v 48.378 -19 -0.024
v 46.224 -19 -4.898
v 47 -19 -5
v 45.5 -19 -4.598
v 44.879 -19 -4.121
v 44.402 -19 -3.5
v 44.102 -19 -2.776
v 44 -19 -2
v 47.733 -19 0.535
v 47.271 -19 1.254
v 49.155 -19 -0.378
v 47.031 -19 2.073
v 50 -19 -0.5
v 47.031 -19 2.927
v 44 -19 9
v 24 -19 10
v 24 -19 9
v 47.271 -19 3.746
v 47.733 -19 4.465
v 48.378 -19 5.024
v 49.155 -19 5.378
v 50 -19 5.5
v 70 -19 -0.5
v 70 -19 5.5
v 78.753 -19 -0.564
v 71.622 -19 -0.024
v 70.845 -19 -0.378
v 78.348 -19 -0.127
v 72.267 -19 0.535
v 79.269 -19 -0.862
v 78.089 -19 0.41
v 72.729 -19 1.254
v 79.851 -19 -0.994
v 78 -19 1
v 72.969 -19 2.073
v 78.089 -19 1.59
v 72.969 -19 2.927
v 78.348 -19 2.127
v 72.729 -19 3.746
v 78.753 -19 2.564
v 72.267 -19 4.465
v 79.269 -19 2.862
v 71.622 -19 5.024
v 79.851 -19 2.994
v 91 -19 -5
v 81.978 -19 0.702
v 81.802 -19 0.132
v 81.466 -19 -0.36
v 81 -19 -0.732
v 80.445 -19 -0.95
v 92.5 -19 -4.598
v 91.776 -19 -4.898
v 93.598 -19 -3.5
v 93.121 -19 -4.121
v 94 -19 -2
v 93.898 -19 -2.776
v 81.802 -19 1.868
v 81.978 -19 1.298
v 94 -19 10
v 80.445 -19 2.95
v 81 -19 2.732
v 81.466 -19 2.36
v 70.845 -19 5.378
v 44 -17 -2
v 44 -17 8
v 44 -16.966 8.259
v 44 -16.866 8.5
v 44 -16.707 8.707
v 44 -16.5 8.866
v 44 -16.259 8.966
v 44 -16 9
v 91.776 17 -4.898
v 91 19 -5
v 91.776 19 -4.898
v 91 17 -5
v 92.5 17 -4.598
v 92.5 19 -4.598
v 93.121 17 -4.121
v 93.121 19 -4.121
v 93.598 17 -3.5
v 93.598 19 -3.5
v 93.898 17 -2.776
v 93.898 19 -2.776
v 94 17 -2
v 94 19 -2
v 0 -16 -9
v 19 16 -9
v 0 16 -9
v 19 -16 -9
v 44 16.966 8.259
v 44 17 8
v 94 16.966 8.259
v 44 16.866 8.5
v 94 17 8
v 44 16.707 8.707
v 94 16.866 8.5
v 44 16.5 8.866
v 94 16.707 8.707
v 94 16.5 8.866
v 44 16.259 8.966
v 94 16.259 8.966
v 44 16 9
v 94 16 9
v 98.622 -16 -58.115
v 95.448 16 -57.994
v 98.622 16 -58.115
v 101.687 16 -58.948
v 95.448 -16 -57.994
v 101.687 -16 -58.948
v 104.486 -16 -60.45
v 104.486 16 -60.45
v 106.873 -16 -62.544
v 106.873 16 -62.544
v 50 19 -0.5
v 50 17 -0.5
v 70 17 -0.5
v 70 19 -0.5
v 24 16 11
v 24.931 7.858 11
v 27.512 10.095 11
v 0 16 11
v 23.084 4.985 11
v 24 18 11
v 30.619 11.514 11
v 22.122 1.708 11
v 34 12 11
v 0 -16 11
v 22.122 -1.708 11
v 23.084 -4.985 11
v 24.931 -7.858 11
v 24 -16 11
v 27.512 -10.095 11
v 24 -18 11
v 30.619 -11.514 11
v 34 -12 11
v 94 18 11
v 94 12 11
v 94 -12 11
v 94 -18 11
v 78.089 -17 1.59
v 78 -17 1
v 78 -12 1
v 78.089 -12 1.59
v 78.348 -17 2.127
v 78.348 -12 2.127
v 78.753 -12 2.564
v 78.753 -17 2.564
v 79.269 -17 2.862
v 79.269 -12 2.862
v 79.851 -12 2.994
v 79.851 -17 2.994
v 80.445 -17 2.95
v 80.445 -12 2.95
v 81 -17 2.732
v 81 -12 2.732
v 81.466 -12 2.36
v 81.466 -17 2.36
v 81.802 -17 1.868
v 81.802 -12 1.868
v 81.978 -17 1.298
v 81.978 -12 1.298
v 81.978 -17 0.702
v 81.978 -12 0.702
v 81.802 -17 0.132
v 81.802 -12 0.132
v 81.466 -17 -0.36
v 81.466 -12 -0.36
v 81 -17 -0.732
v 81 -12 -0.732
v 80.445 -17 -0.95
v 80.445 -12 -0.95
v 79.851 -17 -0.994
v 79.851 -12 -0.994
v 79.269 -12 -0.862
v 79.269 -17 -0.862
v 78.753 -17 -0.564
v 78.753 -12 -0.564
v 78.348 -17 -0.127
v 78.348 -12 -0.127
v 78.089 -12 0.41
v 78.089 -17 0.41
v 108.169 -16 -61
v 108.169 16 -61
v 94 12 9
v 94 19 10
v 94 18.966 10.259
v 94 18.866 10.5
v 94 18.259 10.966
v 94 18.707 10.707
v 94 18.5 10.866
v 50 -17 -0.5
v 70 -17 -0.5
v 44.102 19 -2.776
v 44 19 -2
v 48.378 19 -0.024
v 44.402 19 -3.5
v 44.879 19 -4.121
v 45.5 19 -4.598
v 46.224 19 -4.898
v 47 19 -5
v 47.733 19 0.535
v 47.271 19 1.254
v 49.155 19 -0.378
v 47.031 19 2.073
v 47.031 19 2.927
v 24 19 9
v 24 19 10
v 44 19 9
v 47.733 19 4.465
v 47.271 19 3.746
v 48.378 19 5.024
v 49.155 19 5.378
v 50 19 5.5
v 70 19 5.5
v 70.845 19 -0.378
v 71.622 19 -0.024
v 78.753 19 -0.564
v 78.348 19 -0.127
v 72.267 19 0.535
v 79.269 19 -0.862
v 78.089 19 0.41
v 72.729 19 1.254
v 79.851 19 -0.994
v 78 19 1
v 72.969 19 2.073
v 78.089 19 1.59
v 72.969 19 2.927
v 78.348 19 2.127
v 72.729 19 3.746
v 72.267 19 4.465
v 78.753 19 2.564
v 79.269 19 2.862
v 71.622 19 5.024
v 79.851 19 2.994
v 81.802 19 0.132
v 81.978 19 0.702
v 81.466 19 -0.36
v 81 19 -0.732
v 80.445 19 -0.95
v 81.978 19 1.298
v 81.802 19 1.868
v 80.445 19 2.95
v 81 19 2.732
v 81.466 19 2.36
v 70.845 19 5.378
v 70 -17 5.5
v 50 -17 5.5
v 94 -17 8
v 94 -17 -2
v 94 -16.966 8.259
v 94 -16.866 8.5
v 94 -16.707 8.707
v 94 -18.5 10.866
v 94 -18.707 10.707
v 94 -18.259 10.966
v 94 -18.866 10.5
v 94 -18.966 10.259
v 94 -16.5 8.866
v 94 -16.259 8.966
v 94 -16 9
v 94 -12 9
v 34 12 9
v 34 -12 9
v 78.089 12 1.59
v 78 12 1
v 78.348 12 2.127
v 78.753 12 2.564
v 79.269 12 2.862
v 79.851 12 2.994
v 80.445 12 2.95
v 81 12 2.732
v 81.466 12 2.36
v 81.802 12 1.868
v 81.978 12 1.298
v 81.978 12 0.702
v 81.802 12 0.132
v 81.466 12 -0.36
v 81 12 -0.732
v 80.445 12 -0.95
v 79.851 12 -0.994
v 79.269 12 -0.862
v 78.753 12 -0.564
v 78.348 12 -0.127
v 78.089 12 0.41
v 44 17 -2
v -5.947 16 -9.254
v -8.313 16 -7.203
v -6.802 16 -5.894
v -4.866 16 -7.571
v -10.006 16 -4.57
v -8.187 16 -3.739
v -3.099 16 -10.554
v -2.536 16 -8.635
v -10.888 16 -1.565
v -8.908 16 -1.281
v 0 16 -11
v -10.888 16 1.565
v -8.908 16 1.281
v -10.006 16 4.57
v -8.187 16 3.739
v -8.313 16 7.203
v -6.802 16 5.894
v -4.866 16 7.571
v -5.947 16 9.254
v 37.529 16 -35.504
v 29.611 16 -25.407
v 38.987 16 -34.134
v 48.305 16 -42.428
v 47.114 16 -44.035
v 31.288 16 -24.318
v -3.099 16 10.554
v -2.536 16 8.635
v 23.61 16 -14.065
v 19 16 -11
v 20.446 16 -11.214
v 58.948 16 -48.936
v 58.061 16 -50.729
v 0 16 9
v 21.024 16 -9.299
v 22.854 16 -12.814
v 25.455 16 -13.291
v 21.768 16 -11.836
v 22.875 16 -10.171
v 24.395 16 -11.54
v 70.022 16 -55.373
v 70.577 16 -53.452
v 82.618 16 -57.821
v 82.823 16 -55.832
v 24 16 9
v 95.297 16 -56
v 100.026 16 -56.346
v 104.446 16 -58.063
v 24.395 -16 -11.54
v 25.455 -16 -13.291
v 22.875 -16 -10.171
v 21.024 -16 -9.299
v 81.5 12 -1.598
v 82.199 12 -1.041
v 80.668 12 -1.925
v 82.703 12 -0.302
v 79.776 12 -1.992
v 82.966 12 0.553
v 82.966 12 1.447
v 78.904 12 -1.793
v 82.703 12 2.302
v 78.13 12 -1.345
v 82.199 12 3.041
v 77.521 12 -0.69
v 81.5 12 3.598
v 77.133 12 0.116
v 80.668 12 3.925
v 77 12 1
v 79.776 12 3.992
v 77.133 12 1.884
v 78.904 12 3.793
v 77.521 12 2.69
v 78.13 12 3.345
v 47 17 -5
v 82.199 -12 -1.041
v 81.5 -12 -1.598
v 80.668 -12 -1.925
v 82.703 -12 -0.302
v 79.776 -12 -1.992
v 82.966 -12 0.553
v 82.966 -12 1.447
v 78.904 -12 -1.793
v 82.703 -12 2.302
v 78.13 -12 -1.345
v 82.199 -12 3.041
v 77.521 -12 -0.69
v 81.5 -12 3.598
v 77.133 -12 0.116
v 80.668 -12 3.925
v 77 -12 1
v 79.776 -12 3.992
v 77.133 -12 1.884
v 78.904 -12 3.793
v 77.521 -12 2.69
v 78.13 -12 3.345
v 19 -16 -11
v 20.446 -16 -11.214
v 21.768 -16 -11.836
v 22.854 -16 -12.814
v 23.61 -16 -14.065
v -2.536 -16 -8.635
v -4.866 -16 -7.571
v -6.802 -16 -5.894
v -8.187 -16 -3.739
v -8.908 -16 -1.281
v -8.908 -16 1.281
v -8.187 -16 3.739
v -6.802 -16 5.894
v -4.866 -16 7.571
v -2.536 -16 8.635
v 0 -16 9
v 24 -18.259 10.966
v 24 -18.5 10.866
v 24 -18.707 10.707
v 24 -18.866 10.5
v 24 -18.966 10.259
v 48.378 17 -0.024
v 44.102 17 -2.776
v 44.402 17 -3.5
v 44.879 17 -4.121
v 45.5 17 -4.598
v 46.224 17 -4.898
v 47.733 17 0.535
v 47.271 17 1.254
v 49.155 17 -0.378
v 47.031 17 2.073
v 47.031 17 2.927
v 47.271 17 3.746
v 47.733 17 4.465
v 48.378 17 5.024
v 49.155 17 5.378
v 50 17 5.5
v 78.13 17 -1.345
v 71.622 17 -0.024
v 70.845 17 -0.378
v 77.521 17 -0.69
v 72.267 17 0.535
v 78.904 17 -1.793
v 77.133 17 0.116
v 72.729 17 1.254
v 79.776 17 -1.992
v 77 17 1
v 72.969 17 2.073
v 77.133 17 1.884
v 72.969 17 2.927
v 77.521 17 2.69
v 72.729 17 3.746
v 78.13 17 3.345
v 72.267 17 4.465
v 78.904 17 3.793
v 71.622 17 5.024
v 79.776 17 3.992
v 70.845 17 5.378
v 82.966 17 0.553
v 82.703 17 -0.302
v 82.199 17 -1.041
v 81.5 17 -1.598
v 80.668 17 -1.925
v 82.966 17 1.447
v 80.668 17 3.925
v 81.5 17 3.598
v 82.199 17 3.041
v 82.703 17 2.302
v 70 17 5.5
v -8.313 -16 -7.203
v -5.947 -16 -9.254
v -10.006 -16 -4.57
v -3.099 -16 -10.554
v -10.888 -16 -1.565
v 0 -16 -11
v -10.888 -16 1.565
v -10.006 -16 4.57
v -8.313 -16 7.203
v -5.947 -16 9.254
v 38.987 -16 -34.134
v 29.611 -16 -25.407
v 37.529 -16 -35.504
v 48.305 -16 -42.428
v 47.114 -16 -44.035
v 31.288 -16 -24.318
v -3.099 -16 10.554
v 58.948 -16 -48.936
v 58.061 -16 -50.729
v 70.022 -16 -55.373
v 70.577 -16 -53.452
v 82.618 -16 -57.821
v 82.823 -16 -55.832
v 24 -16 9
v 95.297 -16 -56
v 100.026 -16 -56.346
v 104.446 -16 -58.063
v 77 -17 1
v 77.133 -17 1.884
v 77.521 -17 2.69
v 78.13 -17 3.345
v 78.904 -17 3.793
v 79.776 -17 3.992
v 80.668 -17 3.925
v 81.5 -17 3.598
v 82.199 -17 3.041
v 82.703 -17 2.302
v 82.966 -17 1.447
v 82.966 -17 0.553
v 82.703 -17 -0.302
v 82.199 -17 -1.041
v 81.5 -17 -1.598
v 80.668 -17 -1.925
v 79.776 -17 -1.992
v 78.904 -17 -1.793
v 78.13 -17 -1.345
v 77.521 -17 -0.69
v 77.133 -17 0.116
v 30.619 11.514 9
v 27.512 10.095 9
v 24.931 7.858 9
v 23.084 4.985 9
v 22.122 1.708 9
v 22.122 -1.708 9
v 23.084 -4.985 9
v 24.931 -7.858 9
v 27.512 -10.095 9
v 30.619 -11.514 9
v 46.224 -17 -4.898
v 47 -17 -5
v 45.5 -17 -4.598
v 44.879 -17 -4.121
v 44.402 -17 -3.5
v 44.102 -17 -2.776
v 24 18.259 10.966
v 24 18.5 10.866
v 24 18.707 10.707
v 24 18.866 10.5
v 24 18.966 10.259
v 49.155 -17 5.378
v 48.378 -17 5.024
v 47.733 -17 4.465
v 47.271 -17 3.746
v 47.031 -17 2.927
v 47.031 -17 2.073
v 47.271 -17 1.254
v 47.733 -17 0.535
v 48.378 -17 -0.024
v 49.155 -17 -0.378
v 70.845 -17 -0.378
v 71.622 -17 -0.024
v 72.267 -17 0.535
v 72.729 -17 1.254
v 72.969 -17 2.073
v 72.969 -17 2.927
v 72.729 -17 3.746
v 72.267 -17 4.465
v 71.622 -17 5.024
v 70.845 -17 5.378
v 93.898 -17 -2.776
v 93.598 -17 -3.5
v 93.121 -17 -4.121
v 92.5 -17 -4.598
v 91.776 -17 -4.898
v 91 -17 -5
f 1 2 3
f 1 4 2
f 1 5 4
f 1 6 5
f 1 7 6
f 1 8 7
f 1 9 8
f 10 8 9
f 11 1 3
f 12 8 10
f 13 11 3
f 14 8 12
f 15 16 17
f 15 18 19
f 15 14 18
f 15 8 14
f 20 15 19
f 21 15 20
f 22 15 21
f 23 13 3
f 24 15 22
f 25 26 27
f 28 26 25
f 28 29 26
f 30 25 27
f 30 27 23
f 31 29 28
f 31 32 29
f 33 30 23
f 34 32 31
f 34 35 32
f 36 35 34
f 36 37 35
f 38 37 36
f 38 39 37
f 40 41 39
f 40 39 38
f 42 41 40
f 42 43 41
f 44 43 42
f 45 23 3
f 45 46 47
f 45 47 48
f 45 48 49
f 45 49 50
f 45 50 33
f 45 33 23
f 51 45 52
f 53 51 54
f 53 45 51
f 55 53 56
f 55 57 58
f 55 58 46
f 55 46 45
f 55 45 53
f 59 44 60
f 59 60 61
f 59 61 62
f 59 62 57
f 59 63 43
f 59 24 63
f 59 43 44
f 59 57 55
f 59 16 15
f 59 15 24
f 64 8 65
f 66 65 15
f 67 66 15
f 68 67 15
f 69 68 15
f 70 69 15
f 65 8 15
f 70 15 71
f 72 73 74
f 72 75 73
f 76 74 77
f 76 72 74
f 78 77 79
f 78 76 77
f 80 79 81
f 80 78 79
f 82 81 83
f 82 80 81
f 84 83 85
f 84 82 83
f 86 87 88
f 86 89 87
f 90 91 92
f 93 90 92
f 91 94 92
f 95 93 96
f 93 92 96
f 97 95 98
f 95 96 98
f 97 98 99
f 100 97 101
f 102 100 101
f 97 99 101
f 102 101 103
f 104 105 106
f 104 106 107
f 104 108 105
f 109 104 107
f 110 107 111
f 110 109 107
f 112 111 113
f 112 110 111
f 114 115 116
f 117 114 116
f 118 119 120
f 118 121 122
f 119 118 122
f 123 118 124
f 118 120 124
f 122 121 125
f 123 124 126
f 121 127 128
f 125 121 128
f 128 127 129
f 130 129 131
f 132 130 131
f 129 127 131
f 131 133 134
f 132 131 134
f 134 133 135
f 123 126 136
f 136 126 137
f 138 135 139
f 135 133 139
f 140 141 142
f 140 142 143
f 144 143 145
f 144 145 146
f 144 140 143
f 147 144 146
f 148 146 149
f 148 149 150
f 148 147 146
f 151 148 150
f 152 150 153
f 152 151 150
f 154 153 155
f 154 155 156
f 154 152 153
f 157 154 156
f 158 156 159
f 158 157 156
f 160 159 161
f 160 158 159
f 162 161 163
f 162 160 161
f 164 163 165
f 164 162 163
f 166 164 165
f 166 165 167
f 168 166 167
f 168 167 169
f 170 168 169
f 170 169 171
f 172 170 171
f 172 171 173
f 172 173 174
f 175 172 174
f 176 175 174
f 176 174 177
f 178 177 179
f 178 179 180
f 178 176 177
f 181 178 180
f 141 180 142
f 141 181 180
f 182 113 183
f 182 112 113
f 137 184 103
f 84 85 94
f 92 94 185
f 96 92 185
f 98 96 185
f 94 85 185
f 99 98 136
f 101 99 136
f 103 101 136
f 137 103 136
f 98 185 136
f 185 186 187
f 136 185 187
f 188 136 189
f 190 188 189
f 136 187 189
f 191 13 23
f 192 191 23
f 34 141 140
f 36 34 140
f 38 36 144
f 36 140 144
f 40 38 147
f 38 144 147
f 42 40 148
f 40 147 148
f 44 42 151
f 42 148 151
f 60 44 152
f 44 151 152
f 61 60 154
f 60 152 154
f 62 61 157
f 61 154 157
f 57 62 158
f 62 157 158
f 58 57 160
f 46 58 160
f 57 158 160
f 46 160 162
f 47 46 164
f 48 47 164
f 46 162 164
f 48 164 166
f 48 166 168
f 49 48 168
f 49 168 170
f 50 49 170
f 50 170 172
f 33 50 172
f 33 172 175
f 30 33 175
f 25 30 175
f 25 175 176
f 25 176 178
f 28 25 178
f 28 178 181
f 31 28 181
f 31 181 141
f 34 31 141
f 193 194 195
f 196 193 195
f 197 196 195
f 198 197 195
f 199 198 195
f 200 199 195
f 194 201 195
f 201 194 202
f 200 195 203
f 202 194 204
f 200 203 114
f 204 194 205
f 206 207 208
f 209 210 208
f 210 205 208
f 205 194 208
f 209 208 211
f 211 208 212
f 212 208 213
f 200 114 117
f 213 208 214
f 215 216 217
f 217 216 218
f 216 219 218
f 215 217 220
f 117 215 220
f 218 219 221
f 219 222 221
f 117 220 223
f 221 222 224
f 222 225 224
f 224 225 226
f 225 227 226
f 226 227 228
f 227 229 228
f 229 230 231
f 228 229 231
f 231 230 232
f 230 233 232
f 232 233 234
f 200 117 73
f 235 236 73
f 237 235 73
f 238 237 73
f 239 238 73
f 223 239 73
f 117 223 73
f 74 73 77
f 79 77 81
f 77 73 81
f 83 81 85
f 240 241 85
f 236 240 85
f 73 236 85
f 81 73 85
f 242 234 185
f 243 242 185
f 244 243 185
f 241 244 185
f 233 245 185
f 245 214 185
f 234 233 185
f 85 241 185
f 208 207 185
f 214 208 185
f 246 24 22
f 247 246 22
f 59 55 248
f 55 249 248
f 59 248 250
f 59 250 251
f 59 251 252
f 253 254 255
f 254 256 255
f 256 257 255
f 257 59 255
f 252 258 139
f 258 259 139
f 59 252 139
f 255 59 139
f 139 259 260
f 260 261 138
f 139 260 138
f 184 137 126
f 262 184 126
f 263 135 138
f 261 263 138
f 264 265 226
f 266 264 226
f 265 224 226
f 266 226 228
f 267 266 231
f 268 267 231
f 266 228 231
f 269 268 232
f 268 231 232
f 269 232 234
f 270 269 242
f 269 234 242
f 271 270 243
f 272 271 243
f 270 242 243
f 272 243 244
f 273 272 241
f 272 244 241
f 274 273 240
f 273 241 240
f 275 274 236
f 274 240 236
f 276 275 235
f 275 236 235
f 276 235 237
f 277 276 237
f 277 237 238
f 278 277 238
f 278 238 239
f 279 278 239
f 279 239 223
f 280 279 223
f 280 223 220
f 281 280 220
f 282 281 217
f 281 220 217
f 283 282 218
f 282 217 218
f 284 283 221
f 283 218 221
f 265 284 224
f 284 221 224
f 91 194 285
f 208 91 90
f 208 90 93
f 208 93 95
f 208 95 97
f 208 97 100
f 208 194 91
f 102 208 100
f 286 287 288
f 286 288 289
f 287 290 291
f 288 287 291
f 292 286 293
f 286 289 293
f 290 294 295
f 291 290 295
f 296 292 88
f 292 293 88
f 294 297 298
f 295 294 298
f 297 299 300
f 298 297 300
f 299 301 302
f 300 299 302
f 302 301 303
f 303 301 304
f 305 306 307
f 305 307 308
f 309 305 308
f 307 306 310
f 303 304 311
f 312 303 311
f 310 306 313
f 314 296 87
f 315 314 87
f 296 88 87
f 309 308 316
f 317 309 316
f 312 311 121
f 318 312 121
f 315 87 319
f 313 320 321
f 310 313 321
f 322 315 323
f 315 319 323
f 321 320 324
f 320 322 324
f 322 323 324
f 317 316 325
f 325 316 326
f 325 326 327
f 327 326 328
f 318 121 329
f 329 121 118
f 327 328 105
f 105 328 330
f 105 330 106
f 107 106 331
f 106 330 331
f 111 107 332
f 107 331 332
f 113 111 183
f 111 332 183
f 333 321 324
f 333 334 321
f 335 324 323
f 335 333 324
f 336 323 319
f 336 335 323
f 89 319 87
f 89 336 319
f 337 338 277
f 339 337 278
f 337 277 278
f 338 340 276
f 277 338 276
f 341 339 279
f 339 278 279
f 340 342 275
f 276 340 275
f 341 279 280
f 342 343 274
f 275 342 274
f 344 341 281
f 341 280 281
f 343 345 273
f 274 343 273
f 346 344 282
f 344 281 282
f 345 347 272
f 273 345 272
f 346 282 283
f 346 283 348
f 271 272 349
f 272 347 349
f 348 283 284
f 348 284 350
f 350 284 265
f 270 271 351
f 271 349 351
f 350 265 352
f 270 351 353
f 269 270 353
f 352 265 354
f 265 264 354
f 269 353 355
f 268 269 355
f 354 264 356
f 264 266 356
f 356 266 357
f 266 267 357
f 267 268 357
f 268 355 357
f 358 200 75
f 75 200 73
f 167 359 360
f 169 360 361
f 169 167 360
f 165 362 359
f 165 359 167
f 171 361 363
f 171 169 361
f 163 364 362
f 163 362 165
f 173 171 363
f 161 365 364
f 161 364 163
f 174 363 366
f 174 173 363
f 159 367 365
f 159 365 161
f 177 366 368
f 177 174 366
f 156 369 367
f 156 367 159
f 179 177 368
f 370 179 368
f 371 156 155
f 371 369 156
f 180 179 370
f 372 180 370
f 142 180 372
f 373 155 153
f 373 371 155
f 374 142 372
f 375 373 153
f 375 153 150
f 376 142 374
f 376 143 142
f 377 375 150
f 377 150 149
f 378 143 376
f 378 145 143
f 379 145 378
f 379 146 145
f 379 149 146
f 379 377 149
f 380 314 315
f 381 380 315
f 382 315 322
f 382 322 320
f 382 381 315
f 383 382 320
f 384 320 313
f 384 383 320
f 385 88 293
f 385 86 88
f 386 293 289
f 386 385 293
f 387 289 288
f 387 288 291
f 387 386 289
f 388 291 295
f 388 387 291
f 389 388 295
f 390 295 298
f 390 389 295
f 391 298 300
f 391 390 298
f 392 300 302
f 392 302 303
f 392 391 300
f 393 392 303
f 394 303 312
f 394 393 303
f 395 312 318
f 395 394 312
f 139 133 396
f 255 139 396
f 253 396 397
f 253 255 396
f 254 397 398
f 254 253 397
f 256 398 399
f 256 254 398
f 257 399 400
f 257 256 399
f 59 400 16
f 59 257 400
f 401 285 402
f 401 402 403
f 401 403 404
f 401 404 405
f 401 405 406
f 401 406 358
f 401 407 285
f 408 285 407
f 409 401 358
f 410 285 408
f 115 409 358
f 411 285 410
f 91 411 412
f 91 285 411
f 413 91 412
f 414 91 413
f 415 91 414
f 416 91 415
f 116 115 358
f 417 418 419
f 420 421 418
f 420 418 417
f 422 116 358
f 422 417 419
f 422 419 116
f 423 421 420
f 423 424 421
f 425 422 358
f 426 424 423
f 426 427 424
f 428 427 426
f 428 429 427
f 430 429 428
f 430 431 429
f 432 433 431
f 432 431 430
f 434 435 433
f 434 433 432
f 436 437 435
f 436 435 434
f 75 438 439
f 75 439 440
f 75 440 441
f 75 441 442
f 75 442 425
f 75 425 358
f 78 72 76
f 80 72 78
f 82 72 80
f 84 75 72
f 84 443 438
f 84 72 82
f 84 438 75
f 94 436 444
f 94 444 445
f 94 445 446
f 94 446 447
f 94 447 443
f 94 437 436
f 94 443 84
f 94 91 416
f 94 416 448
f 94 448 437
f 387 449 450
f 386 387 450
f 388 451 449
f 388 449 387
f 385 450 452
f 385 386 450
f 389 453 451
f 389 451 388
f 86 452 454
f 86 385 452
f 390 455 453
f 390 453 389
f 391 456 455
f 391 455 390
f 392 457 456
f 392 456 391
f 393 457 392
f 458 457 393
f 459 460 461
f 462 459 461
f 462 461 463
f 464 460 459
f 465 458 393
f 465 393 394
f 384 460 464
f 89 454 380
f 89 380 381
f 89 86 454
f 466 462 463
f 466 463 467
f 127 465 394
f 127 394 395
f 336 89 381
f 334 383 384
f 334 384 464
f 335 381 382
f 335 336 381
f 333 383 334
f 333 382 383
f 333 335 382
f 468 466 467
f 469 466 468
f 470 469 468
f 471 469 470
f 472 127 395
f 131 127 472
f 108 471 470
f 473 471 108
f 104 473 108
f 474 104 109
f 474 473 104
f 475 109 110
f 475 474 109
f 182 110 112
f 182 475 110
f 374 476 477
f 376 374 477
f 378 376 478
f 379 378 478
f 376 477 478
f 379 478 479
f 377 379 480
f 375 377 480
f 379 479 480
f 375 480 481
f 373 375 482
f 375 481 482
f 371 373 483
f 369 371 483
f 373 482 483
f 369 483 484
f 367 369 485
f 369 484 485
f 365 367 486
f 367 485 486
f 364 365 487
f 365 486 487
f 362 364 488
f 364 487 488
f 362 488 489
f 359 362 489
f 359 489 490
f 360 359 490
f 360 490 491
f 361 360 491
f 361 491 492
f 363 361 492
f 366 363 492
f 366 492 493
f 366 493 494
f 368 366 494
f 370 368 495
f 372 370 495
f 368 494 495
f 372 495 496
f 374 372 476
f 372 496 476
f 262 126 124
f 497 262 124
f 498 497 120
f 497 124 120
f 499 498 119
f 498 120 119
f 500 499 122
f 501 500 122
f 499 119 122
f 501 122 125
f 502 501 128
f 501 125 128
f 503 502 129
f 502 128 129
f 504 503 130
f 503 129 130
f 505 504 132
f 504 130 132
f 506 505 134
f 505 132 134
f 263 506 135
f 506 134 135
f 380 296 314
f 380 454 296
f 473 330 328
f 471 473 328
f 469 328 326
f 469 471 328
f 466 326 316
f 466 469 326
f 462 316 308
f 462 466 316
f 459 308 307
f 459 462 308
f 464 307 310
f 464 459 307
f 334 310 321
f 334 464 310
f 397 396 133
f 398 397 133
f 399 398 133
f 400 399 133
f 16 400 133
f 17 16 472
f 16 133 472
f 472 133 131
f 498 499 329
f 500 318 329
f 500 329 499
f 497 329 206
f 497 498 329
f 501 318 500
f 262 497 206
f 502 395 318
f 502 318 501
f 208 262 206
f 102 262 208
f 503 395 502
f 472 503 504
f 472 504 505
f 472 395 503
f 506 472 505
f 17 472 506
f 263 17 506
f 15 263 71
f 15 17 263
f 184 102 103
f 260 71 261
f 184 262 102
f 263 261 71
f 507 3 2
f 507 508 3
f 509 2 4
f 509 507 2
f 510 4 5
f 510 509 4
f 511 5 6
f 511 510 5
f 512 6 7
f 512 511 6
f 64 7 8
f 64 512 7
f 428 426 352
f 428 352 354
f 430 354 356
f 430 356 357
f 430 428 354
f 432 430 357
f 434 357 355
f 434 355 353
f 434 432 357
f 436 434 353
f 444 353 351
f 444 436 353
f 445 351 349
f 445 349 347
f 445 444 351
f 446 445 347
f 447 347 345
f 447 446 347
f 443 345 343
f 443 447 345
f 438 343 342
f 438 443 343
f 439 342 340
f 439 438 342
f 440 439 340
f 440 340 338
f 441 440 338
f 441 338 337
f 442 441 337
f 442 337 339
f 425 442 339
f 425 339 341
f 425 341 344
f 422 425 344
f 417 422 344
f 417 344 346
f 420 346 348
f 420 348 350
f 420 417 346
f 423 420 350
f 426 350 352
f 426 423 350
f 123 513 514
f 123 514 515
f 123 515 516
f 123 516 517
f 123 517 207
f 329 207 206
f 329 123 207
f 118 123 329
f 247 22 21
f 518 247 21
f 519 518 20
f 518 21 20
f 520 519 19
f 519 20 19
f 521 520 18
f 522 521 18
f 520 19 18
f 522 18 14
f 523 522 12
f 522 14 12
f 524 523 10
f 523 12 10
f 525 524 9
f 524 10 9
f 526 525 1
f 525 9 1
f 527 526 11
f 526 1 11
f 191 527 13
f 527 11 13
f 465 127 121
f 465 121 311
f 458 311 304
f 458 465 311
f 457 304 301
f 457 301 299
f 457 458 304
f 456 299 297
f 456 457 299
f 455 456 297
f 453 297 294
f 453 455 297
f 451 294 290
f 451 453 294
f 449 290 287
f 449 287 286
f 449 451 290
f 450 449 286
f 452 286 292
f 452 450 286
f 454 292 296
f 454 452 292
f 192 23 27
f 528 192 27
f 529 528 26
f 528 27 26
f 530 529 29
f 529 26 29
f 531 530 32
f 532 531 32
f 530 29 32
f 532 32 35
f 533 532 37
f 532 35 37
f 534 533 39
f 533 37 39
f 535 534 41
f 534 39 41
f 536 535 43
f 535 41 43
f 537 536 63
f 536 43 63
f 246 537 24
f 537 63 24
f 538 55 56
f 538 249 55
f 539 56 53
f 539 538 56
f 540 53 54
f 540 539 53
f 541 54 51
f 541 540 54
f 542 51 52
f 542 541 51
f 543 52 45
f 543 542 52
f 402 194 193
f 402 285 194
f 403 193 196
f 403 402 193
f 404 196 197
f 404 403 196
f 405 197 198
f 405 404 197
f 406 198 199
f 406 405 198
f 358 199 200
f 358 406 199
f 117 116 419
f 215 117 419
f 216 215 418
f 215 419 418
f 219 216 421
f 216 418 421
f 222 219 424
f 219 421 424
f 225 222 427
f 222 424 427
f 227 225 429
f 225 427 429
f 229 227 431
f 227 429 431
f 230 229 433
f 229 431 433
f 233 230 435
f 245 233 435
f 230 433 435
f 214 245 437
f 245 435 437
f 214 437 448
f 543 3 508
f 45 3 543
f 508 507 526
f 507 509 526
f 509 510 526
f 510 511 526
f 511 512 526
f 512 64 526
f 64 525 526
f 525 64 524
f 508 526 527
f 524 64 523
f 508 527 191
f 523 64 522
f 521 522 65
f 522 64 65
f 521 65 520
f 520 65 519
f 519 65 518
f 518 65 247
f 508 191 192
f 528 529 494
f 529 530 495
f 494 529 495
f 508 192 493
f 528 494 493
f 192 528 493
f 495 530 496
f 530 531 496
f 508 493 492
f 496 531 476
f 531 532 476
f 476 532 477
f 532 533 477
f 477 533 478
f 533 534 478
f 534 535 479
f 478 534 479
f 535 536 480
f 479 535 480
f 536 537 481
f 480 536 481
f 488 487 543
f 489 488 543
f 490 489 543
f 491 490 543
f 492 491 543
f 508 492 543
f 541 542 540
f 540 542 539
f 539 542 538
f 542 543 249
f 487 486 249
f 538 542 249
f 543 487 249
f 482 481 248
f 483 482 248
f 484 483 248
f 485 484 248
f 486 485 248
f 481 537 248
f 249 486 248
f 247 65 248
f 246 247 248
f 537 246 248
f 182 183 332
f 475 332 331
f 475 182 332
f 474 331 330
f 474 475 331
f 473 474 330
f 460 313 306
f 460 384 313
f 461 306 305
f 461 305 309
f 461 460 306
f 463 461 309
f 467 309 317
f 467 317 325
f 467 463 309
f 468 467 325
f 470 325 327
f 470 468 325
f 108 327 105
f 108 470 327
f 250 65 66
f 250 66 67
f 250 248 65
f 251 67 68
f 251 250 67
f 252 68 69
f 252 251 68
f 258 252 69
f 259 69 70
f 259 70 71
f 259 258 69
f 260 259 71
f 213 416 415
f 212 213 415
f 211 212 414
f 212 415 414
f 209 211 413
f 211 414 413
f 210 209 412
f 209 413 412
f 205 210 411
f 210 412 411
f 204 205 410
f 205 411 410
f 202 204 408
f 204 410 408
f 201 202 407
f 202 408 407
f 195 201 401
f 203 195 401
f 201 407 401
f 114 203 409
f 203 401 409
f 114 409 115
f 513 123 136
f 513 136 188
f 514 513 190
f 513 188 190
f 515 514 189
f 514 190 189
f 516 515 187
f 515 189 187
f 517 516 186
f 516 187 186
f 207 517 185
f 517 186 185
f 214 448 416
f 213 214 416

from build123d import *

# Parameters (mm, degrees)
F1_DEPTH  = 16
F2_W      = 70
F2_H      = 3
F3_DEPTH  = 2
F4_W      = 50
F4_H      = 14
F5_DEPTH  = 2
F6_R      = 1
F9_DEPTH  = 4
F11_DEPTH = 38.001
F13_D     = 4
F14_R     = 3
F14_R_2   = 2
F15_DEPTH = 5
F16_R     = 3


# Not quite as in the source:
# - a pattern or mirror of a feature is missing from the dataset's text; its kind, count and spacing are read off the source's solid


with BuildPart() as f1:
    # F0 (on Front) → F1 (new body)
    with BuildSketch(Plane.XZ):
        with BuildLine():
            Line((94, 11), (0, 11))
            ThreePointArc((0, 11), (-11, 0), (0, -11))
            Line((0, -11), (19, -11))
            ThreePointArc((19, -11), (21.7681124643, -11.8361612201), (23.6103896104, -14.064978646))
            ThreePointArc((23.6103896104, -14.064978646), (52.4378053116, -47.6260855158), (95.4479042723, -57.9942665386))
            ThreePointArc((95.4479042723, -57.9942665386), (101.6870615127, -58.9476250352), (106.8734428361, -62.5444881493))
            Line((106.8734428361, -62.5444881493), (108.1694222725, -61))
            ThreePointArc((108.1694222725, -61), (102.3002117906, -57.039668375), (95.2965735981, -56))
            ThreePointArc((95.2965735981, -56), (53.4811996085, -45.9198240056), (25.4545454545, -13.2909701044))
            ThreePointArc((25.4545454545, -13.2909701044), (22.87535745, -10.1706257081), (19, -9))
            Line((19, -9), (0, -9))
            ThreePointArc((0, -9), (-9, 0), (0, 9))
            Line((0, 9), (94, 9))
            Line((94, 9), (94, 11))
        make_face()
    extrude(amount=F1_DEPTH)

    # F2 (on face) → F3 (join)
    with BuildSketch(Plane.XY.offset(11)):
        with Locations((59, -17.5)):
            Rectangle(F2_W, F2_H)
    extrude(amount=-F3_DEPTH)

    # F4 (on face) → F5 (join)
    with BuildSketch(Plane.XZ.offset(19)):
        with Locations((69, 2)):
            Rectangle(F4_W, F4_H)
    extrude(amount=-F5_DEPTH)

    # F6
    f6_edges = [f1.edges().sort_by_distance(p)[0] for p in [
        (59, -19, 11),
        (69, -17, 9),
    ]]
    fillet(f6_edges, radius=F6_R)

    # F7: F1 across plane


with BuildPart() as f1_1:
    add(f1.part)
    add(f1.part.mirror(Plane.XZ))

    # F8 (on face) → F9 (cut)
    with BuildSketch(Plane.XY.offset(11)):
        with BuildLine():
            Line((94, 12), (34, 12))
            ThreePointArc((34, 12), (22, 0), (34, -12))
            Line((34, -12), (94, -12))
            Line((94, -12), (94, 12))
        make_face()
    extrude(amount=-F9_DEPTH, mode=Mode.SUBTRACT)

    # F10 (on face) → F11 (cut, through all)
    with BuildSketch(Plane.XZ.offset(19)):
        with BuildLine():
            ThreePointArc((70, -0.5), (73, 2.5), (70, 5.5))
            Line((70, 5.5), (50, 5.5))
            ThreePointArc((50, 5.5), (47, 2.5), (50, -0.5))
            Line((50, -0.5), (70, -0.5))
        make_face()
    extrude(amount=-F11_DEPTH, mode=Mode.SUBTRACT)

    # F13 (through all)
    with Locations(Plane.XZ.offset(19)):
        with Locations((80, 1)):
            Hole(F13_D / 2)

    # F14 (on face) → F15 (join)
    with BuildSketch(Plane(origin=(0, -17, 0), x_dir=(-1, 0, 0), z_dir=(0, 1, 0))):
        with Locations((-80, 1)):
            Circle(F14_R)
        with Locations((-80, 1)):
            Circle(F14_R_2, mode=Mode.SUBTRACT)
    f15 = extrude(amount=F15_DEPTH)

    # F15_copies: F15 across plane
    add(f15.mirror(Plane.ZX))

    # F16
    f16_edges = [f1_1.edges().sort_by_distance(p)[0] for p in [
        (94, 18, -5),
        (44, 18, -5),
        (94, -18, -5),
        (44, -18, -5),
    ]]
    fillet(f16_edges, radius=F16_R)


solid = f1_1.part
